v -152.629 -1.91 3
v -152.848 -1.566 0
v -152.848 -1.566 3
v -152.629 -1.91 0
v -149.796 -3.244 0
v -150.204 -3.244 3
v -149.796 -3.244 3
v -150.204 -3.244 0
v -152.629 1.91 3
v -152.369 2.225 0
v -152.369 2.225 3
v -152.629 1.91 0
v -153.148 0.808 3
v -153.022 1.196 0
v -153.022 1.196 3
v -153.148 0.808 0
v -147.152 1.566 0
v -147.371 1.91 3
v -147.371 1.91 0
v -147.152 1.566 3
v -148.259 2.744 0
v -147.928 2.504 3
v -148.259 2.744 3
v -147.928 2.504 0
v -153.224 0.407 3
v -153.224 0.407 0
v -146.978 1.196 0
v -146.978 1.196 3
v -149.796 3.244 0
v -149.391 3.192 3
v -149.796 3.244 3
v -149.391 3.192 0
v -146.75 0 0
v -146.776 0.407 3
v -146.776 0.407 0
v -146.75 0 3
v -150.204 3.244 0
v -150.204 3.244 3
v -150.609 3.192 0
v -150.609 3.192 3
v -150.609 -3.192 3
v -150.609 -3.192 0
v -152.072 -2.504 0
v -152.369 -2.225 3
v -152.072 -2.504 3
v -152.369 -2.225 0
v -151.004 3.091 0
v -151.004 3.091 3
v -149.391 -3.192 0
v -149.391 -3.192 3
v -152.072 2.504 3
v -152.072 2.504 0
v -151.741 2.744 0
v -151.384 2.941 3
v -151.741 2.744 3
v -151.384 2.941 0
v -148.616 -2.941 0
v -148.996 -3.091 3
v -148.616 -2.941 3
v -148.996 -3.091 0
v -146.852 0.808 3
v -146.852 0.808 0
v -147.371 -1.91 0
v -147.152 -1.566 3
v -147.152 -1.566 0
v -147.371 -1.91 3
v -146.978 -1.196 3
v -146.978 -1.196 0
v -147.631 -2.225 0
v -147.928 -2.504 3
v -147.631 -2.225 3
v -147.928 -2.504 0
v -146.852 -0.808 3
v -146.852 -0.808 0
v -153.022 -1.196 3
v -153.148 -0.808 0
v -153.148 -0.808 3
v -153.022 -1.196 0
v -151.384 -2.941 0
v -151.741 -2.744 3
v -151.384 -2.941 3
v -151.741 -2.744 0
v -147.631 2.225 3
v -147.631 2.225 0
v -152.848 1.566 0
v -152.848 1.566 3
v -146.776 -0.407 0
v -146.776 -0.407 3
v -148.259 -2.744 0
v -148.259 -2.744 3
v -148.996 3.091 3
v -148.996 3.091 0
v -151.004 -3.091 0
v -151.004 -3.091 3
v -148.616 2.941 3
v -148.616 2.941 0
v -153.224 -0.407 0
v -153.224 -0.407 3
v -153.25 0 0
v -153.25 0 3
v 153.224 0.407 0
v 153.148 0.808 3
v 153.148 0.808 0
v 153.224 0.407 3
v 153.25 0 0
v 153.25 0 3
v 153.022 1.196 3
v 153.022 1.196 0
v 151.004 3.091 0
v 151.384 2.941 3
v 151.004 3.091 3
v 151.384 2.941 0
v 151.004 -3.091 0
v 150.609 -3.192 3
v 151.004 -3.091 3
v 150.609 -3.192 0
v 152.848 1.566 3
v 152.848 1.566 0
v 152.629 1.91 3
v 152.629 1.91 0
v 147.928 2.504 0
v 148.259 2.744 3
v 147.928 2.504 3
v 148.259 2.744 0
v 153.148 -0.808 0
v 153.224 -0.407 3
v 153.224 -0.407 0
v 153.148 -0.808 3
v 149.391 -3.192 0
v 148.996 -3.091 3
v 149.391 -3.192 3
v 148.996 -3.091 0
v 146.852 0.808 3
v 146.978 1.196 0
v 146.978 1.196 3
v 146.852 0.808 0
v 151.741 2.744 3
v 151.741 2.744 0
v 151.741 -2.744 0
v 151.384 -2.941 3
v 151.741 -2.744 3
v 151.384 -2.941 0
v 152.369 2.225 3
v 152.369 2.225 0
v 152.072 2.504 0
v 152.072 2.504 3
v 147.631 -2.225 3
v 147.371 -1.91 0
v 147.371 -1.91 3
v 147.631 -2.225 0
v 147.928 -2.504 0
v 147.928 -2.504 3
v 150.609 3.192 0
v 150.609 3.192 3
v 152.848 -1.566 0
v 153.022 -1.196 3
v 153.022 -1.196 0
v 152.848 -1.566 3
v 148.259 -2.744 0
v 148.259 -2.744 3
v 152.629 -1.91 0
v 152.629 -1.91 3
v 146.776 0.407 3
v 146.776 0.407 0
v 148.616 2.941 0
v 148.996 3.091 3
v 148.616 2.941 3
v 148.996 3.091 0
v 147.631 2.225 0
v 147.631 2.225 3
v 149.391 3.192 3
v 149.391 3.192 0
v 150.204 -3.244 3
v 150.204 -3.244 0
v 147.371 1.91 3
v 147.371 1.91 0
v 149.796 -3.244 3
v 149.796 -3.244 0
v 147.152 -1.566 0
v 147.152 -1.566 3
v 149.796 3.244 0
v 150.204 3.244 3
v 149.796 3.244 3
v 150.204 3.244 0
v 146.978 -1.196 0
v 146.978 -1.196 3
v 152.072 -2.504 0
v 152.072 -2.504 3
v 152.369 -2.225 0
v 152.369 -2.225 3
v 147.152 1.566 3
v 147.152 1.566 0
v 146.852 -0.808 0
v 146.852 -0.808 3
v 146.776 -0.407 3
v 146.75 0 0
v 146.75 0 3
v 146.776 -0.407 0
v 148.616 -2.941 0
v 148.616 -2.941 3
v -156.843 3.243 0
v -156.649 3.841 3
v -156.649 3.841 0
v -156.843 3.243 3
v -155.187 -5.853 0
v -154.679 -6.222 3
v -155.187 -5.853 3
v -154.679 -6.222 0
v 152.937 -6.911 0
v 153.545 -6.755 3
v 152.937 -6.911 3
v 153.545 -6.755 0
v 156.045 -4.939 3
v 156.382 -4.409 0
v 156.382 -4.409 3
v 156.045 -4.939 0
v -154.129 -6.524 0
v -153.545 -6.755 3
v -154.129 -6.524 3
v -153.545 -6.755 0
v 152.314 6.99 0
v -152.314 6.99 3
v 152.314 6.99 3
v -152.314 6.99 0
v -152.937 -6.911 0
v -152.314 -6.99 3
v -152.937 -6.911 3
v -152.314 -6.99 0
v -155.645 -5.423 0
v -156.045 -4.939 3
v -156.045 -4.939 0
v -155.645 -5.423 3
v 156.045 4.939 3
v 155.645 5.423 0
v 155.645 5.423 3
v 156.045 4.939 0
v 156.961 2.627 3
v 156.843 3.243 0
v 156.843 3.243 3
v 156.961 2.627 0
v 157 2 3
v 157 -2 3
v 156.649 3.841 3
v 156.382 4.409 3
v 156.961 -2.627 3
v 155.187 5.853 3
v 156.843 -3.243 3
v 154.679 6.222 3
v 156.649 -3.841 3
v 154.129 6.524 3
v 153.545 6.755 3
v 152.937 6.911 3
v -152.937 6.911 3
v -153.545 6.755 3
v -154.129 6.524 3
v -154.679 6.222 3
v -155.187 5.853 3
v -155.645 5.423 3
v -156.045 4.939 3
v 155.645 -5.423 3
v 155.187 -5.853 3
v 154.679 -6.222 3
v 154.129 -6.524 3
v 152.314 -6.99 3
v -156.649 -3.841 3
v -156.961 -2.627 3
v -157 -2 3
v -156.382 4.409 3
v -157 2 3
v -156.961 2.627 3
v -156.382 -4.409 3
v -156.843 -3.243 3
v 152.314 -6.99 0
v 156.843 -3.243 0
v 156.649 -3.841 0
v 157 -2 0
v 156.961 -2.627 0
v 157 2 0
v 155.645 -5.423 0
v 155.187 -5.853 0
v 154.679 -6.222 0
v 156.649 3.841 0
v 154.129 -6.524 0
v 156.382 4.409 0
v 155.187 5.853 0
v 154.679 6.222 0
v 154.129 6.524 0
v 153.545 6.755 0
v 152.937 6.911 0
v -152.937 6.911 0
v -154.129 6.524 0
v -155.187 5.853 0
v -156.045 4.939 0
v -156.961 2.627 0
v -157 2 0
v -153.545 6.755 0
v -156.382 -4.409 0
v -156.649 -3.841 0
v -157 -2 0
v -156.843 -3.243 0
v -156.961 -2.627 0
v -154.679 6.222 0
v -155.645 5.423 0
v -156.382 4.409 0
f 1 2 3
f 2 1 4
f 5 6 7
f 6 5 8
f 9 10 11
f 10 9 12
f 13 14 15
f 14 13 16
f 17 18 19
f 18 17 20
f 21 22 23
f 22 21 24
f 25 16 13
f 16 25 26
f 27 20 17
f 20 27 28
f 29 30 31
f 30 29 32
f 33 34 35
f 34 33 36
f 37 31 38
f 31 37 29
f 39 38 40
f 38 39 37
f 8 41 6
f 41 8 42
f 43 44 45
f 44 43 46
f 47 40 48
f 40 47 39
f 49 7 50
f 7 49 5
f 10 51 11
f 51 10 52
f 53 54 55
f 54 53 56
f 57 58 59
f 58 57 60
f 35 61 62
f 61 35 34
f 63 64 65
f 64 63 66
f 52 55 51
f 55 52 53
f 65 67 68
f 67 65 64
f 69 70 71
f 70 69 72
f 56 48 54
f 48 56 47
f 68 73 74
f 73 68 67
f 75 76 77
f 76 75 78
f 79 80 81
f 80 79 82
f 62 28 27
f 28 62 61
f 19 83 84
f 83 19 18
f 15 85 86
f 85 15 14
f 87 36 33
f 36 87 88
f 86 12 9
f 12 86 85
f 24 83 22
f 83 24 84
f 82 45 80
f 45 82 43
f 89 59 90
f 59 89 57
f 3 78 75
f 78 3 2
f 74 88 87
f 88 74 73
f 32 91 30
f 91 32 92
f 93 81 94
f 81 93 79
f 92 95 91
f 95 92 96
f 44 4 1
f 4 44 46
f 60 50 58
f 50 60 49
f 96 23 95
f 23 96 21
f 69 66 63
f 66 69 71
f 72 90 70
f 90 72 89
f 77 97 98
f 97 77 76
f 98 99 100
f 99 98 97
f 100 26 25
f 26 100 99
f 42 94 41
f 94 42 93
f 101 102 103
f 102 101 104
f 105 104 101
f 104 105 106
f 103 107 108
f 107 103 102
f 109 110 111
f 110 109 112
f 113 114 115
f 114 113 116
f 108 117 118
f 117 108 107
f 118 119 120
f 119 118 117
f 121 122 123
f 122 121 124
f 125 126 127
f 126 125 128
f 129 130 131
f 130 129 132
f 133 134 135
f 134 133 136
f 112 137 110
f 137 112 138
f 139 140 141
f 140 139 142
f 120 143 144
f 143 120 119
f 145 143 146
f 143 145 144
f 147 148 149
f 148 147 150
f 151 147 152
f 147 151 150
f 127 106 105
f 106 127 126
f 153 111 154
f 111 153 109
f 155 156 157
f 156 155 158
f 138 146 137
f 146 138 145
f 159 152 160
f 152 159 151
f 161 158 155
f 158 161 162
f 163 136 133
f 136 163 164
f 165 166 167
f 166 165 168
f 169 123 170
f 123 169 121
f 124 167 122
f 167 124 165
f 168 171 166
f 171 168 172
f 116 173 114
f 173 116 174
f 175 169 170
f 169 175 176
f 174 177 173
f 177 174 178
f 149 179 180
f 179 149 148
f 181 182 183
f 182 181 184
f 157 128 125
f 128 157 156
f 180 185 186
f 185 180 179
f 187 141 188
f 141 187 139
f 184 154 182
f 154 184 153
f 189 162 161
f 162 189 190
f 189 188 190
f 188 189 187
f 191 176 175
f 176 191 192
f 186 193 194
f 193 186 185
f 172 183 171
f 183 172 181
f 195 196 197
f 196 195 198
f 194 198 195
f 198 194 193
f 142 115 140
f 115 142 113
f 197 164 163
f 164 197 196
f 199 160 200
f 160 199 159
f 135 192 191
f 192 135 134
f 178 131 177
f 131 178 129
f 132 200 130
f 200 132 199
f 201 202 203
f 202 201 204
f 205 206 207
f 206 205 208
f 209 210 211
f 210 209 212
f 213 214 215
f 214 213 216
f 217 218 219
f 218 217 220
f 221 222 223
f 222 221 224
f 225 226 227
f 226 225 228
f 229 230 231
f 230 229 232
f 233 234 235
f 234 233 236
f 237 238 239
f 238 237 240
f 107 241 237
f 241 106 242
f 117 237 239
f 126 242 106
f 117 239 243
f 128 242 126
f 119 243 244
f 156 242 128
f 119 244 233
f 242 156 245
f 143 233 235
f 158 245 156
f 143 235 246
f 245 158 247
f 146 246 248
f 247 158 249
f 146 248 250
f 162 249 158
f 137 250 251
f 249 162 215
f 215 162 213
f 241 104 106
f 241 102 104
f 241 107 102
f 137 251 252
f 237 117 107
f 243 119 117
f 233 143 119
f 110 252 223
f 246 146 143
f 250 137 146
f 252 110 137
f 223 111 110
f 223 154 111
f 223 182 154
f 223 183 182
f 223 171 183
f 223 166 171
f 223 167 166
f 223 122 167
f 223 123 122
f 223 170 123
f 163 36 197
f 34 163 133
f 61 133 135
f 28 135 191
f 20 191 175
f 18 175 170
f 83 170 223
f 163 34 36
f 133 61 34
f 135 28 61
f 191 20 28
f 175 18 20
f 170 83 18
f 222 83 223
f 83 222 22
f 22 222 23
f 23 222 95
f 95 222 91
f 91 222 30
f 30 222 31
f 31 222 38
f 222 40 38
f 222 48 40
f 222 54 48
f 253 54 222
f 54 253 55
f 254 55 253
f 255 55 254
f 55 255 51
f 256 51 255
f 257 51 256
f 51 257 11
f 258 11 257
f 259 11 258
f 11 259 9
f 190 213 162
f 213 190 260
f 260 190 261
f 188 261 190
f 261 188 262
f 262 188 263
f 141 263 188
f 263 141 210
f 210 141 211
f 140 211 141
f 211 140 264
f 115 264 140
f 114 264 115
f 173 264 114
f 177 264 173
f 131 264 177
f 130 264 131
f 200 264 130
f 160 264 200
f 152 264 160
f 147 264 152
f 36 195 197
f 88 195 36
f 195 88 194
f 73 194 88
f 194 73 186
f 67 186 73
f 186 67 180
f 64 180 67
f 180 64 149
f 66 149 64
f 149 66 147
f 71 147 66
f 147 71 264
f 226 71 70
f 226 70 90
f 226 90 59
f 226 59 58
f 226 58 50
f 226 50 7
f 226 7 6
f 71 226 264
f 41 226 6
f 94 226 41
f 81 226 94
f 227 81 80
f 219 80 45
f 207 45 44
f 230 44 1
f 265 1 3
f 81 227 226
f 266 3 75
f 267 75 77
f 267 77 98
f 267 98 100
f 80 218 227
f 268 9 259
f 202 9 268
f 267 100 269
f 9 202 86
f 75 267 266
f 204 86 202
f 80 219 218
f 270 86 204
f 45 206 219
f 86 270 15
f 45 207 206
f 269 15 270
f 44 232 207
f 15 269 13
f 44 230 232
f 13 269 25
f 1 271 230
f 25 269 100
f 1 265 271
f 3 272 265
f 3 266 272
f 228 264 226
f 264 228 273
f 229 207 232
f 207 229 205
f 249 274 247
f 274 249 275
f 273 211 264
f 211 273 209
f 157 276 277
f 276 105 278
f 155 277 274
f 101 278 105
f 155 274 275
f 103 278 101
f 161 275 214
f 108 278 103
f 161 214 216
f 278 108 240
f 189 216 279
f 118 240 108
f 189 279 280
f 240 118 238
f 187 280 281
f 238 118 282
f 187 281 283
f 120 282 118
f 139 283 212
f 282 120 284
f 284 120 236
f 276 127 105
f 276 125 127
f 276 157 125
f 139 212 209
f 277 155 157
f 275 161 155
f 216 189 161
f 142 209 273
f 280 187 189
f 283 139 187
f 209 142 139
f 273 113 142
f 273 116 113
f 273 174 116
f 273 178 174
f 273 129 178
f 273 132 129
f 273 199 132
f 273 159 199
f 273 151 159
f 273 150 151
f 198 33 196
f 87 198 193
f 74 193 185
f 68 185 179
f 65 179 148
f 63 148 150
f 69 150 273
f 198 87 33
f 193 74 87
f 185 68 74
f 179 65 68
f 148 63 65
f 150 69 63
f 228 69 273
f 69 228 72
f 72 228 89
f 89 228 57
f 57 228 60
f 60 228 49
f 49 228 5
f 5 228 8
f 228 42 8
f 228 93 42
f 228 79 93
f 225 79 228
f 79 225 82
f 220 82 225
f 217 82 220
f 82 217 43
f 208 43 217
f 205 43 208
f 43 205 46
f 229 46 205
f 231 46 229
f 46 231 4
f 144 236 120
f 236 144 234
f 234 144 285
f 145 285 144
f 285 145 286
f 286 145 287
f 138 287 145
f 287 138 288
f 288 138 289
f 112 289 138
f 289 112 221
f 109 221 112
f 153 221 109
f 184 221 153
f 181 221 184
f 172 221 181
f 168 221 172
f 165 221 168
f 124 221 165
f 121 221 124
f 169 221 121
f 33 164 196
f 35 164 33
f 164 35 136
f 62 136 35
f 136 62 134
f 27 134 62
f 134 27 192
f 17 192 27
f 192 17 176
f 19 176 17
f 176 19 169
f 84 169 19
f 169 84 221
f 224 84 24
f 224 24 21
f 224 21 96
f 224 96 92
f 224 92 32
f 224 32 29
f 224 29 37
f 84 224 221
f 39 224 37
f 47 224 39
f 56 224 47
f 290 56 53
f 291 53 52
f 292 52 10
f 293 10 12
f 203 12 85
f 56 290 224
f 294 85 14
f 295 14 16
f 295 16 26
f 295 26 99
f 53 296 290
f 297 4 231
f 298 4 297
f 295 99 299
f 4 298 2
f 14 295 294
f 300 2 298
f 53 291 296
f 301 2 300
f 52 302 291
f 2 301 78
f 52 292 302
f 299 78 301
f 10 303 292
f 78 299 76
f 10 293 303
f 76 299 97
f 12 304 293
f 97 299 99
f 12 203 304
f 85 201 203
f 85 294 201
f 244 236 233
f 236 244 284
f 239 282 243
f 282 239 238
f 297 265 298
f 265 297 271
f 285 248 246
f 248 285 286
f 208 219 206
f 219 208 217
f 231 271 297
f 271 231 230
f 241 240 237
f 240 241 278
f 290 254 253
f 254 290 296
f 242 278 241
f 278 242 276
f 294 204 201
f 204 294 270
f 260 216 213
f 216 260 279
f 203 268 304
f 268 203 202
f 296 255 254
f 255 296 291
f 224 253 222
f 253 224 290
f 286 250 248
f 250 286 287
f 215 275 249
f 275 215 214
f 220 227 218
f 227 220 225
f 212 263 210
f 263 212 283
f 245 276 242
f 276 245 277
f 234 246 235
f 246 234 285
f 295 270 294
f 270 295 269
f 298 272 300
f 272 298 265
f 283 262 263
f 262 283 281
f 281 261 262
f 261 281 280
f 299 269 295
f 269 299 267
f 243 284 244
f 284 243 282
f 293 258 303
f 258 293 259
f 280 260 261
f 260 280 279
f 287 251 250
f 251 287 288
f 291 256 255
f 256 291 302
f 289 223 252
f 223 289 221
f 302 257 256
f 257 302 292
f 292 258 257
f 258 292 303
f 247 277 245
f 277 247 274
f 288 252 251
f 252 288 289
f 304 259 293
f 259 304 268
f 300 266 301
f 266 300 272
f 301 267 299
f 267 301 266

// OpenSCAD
$fn = 50;


difference() {
	union() {
		hull() {
			translate(v = [-152.0000000000, 2.0000000000, 0]) {
				cylinder(h = 3, r = 5);
			}
			translate(v = [152.0000000000, 2.0000000000, 0]) {
				cylinder(h = 3, r = 5);
			}
			translate(v = [-152.0000000000, -2.0000000000, 0]) {
				cylinder(h = 3, r = 5);
			}
			translate(v = [152.0000000000, -2.0000000000, 0]) {
				cylinder(h = 3, r = 5);
			}
		}
	}
	union() {
		translate(v = [-150.0000000000, 0.0000000000, -100.0000000000]) {
			cylinder(h = 200, r = 3.2500000000);
		}
		translate(v = [-150.0000000000, 0.0000000000, -100.0000000000]) {
			cylinder(h = 200, r = 3.2500000000);
		}
		translate(v = [150.0000000000, 0.0000000000, -100.0000000000]) {
			cylinder(h = 200, r = 3.2500000000);
		}
		translate(v = [150.0000000000, 0.0000000000, -100.0000000000]) {
			cylinder(h = 200, r = 3.2500000000);
		}
	}
}
